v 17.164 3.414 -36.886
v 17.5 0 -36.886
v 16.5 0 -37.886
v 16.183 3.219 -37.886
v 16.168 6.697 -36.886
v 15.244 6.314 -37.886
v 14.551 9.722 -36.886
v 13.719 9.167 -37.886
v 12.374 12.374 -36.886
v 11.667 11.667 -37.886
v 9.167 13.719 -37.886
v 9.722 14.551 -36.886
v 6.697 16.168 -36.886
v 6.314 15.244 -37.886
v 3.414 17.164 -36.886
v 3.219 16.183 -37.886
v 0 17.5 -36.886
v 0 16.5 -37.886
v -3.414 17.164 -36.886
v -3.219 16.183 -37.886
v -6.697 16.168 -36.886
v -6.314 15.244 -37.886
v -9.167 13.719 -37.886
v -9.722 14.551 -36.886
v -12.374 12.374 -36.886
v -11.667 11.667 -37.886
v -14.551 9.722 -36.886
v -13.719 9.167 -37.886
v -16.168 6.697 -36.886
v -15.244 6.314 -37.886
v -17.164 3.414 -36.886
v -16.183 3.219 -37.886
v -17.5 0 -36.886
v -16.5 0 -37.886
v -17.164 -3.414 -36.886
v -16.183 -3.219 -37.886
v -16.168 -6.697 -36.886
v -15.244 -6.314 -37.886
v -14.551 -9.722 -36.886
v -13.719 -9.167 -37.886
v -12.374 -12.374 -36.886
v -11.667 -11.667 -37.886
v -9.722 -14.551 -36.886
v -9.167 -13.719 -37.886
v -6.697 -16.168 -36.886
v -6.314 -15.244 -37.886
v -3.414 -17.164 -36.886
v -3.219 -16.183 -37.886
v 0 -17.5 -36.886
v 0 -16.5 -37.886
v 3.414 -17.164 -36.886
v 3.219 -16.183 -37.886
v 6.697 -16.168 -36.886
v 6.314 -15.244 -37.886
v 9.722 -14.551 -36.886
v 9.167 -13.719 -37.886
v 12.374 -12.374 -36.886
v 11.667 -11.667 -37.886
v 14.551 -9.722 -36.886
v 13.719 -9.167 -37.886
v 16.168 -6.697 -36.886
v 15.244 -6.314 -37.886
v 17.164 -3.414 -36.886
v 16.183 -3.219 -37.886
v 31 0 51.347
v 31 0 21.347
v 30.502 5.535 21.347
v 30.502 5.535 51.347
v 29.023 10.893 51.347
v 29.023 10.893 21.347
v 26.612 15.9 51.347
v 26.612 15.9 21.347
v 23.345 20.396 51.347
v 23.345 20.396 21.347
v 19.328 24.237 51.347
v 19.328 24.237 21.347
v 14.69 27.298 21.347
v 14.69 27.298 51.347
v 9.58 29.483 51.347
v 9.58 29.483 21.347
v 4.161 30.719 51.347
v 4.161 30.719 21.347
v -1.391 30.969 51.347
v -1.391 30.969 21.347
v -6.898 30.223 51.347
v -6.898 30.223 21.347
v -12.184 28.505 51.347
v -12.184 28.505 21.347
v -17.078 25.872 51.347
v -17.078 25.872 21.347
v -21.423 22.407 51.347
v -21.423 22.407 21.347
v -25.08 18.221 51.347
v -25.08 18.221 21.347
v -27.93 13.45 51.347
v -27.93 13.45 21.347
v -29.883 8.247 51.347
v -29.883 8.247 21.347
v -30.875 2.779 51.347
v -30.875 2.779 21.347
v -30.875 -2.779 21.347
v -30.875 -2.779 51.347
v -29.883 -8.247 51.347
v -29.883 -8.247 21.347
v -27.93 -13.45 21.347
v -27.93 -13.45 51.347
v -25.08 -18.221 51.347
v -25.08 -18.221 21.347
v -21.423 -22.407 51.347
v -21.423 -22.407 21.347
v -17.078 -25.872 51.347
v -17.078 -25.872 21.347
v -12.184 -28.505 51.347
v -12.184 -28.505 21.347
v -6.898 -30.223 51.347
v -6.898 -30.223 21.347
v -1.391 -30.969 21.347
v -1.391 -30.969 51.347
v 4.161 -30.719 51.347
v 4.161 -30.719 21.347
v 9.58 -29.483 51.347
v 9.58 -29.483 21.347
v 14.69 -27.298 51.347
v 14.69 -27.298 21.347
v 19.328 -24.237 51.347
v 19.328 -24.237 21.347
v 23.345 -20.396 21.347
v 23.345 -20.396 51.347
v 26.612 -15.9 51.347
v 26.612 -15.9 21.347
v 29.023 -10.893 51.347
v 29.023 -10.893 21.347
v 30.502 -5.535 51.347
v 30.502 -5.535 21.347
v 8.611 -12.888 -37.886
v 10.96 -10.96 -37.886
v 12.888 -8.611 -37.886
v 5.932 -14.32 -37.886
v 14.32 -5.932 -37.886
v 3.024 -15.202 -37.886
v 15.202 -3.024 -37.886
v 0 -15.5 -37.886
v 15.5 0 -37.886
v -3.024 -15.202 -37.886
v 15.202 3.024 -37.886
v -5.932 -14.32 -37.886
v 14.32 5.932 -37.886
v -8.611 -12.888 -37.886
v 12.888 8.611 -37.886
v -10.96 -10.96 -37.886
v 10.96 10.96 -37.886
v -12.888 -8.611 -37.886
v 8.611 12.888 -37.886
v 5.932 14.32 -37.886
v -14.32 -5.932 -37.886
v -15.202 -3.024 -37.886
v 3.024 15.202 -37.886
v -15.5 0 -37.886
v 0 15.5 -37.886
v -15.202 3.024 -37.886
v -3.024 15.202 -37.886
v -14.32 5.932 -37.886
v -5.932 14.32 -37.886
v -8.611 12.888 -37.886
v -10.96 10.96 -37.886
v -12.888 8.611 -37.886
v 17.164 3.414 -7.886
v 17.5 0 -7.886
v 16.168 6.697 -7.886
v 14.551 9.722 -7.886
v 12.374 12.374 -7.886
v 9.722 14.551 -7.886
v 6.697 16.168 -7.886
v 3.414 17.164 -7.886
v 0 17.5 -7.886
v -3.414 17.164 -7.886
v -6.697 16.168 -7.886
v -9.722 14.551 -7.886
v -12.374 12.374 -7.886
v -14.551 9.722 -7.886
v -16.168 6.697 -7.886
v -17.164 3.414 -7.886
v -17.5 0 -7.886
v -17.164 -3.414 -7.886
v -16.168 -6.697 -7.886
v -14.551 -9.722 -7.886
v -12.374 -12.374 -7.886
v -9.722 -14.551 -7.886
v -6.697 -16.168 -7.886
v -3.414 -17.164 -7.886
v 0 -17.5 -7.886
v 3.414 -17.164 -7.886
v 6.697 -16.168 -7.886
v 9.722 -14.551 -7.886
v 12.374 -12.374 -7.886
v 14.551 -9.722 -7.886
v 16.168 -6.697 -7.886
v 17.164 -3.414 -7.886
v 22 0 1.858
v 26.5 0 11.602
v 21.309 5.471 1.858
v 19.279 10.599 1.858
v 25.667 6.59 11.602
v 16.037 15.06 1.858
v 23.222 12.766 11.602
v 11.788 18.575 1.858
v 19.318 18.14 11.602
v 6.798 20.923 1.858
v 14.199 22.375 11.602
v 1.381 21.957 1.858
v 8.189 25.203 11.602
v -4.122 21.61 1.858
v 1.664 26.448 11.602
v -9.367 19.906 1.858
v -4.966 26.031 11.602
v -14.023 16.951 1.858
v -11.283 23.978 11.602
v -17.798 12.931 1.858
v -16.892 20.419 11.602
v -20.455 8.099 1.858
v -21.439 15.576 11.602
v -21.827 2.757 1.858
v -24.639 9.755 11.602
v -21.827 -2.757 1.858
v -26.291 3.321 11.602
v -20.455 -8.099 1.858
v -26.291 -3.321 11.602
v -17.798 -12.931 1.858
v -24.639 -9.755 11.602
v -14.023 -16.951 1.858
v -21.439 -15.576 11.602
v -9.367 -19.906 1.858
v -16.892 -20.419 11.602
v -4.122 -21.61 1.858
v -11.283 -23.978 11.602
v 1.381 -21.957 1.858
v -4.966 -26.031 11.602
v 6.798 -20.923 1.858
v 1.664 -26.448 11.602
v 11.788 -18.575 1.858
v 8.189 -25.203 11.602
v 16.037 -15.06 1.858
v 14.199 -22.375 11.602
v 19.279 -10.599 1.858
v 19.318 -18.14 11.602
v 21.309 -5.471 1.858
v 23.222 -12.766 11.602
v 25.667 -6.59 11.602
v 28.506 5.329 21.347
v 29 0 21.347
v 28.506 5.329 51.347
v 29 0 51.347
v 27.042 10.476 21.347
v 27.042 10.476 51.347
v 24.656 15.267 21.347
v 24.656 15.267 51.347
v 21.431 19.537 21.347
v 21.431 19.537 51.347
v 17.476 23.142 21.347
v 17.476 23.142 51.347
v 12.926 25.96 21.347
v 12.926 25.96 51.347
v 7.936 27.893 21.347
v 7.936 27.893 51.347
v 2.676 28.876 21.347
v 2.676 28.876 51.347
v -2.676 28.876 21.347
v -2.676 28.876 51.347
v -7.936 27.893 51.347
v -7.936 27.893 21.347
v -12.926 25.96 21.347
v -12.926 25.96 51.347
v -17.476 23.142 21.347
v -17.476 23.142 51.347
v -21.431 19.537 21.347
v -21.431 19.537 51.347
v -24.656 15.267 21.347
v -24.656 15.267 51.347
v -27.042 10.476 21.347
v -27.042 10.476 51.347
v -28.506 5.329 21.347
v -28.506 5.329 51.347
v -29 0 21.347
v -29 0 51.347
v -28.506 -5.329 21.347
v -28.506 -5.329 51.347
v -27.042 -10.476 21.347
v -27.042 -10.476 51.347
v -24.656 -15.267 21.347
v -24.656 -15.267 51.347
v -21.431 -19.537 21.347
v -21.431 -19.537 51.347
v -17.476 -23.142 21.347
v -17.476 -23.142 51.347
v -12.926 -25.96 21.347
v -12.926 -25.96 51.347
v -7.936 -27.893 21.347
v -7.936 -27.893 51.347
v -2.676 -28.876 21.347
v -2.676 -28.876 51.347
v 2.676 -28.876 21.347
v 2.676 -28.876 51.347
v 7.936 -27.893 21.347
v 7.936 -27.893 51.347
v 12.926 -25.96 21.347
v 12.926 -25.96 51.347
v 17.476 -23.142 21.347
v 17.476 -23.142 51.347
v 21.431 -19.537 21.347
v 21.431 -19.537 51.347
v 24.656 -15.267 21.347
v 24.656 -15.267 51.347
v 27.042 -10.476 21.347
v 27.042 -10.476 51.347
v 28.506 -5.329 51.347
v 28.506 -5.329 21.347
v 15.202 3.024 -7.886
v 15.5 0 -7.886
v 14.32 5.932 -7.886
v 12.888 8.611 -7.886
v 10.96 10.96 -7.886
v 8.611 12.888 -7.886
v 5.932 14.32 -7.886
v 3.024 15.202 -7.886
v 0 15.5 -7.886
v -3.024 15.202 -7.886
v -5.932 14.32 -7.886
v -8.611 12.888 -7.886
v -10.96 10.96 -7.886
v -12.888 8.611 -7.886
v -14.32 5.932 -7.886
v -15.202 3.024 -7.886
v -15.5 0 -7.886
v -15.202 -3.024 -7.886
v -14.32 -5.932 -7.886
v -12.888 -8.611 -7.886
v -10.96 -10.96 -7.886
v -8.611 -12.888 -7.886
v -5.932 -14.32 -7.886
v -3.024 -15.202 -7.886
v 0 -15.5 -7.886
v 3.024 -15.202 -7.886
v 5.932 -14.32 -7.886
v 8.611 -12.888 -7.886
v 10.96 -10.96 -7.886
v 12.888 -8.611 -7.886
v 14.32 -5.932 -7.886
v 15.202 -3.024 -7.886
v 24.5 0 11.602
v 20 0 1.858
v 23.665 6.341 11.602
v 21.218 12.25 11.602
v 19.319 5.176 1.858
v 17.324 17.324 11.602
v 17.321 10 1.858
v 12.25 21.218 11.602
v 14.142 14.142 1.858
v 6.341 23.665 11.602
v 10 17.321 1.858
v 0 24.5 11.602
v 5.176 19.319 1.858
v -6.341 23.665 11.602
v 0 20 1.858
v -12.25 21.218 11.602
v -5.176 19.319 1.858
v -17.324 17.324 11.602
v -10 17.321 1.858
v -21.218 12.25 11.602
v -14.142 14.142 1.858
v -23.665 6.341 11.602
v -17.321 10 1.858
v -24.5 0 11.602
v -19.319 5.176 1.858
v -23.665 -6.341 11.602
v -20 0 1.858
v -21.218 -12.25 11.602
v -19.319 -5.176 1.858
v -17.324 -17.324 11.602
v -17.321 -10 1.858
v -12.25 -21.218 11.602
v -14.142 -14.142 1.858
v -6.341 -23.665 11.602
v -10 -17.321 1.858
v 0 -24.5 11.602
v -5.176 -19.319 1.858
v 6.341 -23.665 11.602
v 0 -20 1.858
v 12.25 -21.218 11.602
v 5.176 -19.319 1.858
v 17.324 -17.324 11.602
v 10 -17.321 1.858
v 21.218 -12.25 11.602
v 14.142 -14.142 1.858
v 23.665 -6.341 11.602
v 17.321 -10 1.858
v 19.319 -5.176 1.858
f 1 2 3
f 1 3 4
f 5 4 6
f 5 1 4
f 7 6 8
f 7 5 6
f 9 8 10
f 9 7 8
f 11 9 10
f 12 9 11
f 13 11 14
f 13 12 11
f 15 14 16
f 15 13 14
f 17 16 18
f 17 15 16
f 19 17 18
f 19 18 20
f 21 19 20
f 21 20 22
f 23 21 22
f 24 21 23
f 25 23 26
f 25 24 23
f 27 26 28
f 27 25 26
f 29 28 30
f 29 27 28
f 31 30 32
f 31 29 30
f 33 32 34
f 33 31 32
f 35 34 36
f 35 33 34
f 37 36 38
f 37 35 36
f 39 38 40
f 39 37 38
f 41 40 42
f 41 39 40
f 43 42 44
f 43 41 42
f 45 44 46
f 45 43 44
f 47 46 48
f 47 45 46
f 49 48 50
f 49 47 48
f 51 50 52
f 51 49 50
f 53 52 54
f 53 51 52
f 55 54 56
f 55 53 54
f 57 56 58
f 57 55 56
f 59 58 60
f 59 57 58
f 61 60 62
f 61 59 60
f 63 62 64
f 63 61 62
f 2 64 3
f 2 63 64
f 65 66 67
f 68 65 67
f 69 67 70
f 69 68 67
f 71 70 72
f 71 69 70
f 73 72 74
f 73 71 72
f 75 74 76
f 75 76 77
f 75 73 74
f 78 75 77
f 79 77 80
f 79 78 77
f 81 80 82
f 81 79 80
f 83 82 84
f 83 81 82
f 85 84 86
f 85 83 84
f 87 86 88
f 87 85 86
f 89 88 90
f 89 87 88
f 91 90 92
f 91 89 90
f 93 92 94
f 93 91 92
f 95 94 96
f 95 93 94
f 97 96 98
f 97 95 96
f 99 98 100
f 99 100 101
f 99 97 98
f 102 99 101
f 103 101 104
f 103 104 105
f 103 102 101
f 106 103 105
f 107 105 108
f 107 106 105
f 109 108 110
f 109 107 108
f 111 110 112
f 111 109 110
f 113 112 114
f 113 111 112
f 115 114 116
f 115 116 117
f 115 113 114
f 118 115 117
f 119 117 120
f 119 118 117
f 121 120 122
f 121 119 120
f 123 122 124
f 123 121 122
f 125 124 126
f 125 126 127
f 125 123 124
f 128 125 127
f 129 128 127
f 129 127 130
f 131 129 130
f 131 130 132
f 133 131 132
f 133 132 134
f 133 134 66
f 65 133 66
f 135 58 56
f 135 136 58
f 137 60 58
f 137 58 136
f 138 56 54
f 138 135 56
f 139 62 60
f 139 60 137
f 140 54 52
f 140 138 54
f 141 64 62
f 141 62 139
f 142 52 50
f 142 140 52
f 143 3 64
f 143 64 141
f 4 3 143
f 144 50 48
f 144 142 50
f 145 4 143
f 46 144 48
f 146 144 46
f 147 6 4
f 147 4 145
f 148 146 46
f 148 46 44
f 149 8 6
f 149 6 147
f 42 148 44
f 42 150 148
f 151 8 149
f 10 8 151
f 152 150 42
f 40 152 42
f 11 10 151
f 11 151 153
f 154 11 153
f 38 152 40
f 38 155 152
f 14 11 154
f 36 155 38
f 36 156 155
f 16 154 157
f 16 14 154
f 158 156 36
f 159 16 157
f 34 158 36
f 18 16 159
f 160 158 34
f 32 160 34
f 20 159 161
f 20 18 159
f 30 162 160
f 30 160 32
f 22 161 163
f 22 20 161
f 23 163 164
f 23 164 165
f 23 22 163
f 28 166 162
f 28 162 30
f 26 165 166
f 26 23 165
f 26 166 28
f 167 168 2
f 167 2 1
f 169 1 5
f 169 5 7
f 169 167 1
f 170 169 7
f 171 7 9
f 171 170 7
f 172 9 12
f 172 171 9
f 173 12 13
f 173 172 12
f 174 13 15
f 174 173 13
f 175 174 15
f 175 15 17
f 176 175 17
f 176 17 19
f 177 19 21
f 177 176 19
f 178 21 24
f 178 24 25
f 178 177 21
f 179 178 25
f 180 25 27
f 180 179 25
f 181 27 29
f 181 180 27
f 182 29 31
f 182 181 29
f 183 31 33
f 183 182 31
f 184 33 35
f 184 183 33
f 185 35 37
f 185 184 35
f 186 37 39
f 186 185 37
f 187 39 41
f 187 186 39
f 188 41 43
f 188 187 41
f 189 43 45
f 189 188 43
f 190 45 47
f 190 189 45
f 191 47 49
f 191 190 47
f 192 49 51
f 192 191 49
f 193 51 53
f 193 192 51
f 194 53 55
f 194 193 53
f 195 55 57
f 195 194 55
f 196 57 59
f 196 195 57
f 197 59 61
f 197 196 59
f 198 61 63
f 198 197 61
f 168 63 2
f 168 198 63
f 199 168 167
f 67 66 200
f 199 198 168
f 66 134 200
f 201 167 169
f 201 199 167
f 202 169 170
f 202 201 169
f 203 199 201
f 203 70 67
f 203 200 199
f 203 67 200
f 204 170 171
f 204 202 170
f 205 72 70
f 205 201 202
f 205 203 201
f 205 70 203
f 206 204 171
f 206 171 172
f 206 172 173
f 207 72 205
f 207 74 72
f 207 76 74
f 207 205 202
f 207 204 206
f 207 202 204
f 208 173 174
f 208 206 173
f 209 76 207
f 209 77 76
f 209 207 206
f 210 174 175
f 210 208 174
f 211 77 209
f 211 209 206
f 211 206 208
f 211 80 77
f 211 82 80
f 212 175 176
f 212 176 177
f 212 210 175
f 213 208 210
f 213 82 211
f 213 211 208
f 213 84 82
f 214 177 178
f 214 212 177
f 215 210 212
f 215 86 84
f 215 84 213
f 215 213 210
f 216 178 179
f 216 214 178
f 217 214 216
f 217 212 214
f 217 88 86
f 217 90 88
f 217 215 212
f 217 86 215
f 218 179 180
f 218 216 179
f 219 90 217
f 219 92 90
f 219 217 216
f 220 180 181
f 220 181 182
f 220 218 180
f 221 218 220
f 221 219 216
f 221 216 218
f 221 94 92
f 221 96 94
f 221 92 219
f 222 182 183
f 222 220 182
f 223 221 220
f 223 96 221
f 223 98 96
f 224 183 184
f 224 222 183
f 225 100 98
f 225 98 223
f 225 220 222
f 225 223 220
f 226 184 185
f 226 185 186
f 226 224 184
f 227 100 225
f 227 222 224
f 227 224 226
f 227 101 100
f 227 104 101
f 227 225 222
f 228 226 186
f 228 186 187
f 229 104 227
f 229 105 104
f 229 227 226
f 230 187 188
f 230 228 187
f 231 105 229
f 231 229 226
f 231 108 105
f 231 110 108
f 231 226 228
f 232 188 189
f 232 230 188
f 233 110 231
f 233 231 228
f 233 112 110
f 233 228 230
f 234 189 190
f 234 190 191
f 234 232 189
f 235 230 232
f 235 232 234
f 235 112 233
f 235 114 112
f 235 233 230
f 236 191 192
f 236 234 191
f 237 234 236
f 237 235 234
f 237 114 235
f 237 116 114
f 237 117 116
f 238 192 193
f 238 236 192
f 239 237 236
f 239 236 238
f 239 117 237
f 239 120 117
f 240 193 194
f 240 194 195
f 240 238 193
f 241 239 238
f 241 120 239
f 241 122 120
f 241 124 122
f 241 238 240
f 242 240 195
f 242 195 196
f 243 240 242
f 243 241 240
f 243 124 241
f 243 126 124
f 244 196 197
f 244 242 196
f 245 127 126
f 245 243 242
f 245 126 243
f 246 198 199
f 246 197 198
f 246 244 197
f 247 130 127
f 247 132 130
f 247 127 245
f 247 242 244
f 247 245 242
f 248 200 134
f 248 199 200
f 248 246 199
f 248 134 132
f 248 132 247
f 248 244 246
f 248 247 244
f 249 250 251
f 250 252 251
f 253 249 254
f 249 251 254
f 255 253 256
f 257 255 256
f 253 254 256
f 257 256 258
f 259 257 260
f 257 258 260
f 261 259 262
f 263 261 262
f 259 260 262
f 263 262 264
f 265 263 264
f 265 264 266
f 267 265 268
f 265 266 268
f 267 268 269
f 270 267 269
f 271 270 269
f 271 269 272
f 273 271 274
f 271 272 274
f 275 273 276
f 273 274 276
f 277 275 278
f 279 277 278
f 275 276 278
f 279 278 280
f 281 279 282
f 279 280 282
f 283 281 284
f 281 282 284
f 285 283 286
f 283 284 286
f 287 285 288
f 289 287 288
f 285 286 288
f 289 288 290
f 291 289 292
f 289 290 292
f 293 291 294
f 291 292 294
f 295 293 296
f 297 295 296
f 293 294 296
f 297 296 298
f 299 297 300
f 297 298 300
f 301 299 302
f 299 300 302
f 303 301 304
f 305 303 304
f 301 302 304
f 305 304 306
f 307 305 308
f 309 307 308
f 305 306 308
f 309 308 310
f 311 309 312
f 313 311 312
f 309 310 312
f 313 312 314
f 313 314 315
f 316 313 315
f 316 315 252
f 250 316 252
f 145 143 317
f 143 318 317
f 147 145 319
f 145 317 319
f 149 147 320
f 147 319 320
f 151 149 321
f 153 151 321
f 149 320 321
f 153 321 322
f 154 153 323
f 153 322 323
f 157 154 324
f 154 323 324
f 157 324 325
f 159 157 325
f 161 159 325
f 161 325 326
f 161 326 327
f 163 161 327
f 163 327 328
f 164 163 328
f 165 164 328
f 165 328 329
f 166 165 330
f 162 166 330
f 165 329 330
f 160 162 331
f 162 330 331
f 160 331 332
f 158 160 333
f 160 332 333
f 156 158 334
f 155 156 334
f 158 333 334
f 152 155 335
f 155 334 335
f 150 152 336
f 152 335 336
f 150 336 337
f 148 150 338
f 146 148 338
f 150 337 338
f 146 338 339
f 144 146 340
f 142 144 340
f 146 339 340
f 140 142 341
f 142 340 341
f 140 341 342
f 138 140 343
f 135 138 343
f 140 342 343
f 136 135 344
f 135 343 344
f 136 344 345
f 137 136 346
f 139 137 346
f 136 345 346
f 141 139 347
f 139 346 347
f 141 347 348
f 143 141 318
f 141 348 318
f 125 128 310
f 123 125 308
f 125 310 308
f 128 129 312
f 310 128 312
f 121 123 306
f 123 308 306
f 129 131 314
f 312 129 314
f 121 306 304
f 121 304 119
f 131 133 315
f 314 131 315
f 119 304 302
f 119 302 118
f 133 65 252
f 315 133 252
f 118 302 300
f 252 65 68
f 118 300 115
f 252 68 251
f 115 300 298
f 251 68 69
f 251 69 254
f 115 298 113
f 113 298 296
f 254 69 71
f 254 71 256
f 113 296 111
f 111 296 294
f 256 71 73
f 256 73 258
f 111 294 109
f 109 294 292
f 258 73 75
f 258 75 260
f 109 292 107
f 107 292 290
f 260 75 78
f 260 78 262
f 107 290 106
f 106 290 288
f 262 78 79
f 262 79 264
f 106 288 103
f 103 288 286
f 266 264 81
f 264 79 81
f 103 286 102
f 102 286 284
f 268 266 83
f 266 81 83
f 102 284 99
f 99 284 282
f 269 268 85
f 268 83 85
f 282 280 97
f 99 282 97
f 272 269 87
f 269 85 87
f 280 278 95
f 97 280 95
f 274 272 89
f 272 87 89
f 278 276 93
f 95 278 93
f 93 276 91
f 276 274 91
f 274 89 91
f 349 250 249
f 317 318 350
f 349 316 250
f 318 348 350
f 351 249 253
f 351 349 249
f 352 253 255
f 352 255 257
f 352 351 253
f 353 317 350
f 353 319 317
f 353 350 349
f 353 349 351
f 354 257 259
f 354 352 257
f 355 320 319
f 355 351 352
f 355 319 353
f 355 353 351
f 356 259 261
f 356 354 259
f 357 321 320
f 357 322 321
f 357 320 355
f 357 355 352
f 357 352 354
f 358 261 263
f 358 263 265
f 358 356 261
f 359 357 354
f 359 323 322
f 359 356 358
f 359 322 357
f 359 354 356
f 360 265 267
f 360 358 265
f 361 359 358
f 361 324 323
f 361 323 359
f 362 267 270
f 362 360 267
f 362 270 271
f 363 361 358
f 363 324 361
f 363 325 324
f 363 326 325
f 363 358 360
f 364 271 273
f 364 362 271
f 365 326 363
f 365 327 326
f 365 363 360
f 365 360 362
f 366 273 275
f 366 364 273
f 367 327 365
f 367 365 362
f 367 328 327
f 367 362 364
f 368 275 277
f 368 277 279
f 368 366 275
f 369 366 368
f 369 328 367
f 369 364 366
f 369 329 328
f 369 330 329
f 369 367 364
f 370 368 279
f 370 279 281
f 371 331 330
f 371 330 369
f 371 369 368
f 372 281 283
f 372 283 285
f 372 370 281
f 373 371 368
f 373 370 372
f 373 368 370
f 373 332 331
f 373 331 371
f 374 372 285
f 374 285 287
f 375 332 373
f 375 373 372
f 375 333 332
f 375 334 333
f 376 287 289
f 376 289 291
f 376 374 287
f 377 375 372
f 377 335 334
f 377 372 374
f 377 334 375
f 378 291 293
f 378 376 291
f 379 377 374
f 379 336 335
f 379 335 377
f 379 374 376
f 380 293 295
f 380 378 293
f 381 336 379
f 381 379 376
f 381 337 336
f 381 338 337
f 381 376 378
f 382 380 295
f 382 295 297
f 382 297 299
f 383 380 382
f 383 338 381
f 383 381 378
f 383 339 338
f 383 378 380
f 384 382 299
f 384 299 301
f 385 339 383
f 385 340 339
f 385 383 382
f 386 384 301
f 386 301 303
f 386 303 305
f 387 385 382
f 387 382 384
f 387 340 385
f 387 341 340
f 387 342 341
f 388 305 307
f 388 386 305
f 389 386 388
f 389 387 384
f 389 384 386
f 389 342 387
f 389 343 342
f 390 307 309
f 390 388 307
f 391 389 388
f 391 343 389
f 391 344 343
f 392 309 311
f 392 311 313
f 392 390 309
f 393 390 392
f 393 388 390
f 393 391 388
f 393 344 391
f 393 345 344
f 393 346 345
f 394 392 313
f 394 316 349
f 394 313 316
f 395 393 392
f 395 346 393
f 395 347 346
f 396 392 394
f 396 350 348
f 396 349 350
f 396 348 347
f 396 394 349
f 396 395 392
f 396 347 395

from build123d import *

# Parameters (mm, degrees)
F0_W    = 2
F0_H    = 30
F2_SIZE = 1


with BuildPart() as f1:
    # F0 (on Front) → F1 (revolve)
    with BuildSketch(Plane.XZ):
        with Locations((30, 36.346545)):
            Rectangle(F0_W, F0_H)
        Polygon((31, 21.346545), (29, 21.346545), (15.5, -7.885725), (17.5, -7.885725), align=None)
        with Locations((16.5, -22.885725)):
            Rectangle(F0_W, F0_H)
    revolve(axis=Axis((0, 0, 12.964369), (0, 0, 1)))

    # F2
    f2_edges = [f1.edges().sort_by_distance(p)[0] for p in [
        (-17.5, 0, -37.885725),
    ]]
    chamfer(f2_edges, length=F2_SIZE)


solid = f1.part
